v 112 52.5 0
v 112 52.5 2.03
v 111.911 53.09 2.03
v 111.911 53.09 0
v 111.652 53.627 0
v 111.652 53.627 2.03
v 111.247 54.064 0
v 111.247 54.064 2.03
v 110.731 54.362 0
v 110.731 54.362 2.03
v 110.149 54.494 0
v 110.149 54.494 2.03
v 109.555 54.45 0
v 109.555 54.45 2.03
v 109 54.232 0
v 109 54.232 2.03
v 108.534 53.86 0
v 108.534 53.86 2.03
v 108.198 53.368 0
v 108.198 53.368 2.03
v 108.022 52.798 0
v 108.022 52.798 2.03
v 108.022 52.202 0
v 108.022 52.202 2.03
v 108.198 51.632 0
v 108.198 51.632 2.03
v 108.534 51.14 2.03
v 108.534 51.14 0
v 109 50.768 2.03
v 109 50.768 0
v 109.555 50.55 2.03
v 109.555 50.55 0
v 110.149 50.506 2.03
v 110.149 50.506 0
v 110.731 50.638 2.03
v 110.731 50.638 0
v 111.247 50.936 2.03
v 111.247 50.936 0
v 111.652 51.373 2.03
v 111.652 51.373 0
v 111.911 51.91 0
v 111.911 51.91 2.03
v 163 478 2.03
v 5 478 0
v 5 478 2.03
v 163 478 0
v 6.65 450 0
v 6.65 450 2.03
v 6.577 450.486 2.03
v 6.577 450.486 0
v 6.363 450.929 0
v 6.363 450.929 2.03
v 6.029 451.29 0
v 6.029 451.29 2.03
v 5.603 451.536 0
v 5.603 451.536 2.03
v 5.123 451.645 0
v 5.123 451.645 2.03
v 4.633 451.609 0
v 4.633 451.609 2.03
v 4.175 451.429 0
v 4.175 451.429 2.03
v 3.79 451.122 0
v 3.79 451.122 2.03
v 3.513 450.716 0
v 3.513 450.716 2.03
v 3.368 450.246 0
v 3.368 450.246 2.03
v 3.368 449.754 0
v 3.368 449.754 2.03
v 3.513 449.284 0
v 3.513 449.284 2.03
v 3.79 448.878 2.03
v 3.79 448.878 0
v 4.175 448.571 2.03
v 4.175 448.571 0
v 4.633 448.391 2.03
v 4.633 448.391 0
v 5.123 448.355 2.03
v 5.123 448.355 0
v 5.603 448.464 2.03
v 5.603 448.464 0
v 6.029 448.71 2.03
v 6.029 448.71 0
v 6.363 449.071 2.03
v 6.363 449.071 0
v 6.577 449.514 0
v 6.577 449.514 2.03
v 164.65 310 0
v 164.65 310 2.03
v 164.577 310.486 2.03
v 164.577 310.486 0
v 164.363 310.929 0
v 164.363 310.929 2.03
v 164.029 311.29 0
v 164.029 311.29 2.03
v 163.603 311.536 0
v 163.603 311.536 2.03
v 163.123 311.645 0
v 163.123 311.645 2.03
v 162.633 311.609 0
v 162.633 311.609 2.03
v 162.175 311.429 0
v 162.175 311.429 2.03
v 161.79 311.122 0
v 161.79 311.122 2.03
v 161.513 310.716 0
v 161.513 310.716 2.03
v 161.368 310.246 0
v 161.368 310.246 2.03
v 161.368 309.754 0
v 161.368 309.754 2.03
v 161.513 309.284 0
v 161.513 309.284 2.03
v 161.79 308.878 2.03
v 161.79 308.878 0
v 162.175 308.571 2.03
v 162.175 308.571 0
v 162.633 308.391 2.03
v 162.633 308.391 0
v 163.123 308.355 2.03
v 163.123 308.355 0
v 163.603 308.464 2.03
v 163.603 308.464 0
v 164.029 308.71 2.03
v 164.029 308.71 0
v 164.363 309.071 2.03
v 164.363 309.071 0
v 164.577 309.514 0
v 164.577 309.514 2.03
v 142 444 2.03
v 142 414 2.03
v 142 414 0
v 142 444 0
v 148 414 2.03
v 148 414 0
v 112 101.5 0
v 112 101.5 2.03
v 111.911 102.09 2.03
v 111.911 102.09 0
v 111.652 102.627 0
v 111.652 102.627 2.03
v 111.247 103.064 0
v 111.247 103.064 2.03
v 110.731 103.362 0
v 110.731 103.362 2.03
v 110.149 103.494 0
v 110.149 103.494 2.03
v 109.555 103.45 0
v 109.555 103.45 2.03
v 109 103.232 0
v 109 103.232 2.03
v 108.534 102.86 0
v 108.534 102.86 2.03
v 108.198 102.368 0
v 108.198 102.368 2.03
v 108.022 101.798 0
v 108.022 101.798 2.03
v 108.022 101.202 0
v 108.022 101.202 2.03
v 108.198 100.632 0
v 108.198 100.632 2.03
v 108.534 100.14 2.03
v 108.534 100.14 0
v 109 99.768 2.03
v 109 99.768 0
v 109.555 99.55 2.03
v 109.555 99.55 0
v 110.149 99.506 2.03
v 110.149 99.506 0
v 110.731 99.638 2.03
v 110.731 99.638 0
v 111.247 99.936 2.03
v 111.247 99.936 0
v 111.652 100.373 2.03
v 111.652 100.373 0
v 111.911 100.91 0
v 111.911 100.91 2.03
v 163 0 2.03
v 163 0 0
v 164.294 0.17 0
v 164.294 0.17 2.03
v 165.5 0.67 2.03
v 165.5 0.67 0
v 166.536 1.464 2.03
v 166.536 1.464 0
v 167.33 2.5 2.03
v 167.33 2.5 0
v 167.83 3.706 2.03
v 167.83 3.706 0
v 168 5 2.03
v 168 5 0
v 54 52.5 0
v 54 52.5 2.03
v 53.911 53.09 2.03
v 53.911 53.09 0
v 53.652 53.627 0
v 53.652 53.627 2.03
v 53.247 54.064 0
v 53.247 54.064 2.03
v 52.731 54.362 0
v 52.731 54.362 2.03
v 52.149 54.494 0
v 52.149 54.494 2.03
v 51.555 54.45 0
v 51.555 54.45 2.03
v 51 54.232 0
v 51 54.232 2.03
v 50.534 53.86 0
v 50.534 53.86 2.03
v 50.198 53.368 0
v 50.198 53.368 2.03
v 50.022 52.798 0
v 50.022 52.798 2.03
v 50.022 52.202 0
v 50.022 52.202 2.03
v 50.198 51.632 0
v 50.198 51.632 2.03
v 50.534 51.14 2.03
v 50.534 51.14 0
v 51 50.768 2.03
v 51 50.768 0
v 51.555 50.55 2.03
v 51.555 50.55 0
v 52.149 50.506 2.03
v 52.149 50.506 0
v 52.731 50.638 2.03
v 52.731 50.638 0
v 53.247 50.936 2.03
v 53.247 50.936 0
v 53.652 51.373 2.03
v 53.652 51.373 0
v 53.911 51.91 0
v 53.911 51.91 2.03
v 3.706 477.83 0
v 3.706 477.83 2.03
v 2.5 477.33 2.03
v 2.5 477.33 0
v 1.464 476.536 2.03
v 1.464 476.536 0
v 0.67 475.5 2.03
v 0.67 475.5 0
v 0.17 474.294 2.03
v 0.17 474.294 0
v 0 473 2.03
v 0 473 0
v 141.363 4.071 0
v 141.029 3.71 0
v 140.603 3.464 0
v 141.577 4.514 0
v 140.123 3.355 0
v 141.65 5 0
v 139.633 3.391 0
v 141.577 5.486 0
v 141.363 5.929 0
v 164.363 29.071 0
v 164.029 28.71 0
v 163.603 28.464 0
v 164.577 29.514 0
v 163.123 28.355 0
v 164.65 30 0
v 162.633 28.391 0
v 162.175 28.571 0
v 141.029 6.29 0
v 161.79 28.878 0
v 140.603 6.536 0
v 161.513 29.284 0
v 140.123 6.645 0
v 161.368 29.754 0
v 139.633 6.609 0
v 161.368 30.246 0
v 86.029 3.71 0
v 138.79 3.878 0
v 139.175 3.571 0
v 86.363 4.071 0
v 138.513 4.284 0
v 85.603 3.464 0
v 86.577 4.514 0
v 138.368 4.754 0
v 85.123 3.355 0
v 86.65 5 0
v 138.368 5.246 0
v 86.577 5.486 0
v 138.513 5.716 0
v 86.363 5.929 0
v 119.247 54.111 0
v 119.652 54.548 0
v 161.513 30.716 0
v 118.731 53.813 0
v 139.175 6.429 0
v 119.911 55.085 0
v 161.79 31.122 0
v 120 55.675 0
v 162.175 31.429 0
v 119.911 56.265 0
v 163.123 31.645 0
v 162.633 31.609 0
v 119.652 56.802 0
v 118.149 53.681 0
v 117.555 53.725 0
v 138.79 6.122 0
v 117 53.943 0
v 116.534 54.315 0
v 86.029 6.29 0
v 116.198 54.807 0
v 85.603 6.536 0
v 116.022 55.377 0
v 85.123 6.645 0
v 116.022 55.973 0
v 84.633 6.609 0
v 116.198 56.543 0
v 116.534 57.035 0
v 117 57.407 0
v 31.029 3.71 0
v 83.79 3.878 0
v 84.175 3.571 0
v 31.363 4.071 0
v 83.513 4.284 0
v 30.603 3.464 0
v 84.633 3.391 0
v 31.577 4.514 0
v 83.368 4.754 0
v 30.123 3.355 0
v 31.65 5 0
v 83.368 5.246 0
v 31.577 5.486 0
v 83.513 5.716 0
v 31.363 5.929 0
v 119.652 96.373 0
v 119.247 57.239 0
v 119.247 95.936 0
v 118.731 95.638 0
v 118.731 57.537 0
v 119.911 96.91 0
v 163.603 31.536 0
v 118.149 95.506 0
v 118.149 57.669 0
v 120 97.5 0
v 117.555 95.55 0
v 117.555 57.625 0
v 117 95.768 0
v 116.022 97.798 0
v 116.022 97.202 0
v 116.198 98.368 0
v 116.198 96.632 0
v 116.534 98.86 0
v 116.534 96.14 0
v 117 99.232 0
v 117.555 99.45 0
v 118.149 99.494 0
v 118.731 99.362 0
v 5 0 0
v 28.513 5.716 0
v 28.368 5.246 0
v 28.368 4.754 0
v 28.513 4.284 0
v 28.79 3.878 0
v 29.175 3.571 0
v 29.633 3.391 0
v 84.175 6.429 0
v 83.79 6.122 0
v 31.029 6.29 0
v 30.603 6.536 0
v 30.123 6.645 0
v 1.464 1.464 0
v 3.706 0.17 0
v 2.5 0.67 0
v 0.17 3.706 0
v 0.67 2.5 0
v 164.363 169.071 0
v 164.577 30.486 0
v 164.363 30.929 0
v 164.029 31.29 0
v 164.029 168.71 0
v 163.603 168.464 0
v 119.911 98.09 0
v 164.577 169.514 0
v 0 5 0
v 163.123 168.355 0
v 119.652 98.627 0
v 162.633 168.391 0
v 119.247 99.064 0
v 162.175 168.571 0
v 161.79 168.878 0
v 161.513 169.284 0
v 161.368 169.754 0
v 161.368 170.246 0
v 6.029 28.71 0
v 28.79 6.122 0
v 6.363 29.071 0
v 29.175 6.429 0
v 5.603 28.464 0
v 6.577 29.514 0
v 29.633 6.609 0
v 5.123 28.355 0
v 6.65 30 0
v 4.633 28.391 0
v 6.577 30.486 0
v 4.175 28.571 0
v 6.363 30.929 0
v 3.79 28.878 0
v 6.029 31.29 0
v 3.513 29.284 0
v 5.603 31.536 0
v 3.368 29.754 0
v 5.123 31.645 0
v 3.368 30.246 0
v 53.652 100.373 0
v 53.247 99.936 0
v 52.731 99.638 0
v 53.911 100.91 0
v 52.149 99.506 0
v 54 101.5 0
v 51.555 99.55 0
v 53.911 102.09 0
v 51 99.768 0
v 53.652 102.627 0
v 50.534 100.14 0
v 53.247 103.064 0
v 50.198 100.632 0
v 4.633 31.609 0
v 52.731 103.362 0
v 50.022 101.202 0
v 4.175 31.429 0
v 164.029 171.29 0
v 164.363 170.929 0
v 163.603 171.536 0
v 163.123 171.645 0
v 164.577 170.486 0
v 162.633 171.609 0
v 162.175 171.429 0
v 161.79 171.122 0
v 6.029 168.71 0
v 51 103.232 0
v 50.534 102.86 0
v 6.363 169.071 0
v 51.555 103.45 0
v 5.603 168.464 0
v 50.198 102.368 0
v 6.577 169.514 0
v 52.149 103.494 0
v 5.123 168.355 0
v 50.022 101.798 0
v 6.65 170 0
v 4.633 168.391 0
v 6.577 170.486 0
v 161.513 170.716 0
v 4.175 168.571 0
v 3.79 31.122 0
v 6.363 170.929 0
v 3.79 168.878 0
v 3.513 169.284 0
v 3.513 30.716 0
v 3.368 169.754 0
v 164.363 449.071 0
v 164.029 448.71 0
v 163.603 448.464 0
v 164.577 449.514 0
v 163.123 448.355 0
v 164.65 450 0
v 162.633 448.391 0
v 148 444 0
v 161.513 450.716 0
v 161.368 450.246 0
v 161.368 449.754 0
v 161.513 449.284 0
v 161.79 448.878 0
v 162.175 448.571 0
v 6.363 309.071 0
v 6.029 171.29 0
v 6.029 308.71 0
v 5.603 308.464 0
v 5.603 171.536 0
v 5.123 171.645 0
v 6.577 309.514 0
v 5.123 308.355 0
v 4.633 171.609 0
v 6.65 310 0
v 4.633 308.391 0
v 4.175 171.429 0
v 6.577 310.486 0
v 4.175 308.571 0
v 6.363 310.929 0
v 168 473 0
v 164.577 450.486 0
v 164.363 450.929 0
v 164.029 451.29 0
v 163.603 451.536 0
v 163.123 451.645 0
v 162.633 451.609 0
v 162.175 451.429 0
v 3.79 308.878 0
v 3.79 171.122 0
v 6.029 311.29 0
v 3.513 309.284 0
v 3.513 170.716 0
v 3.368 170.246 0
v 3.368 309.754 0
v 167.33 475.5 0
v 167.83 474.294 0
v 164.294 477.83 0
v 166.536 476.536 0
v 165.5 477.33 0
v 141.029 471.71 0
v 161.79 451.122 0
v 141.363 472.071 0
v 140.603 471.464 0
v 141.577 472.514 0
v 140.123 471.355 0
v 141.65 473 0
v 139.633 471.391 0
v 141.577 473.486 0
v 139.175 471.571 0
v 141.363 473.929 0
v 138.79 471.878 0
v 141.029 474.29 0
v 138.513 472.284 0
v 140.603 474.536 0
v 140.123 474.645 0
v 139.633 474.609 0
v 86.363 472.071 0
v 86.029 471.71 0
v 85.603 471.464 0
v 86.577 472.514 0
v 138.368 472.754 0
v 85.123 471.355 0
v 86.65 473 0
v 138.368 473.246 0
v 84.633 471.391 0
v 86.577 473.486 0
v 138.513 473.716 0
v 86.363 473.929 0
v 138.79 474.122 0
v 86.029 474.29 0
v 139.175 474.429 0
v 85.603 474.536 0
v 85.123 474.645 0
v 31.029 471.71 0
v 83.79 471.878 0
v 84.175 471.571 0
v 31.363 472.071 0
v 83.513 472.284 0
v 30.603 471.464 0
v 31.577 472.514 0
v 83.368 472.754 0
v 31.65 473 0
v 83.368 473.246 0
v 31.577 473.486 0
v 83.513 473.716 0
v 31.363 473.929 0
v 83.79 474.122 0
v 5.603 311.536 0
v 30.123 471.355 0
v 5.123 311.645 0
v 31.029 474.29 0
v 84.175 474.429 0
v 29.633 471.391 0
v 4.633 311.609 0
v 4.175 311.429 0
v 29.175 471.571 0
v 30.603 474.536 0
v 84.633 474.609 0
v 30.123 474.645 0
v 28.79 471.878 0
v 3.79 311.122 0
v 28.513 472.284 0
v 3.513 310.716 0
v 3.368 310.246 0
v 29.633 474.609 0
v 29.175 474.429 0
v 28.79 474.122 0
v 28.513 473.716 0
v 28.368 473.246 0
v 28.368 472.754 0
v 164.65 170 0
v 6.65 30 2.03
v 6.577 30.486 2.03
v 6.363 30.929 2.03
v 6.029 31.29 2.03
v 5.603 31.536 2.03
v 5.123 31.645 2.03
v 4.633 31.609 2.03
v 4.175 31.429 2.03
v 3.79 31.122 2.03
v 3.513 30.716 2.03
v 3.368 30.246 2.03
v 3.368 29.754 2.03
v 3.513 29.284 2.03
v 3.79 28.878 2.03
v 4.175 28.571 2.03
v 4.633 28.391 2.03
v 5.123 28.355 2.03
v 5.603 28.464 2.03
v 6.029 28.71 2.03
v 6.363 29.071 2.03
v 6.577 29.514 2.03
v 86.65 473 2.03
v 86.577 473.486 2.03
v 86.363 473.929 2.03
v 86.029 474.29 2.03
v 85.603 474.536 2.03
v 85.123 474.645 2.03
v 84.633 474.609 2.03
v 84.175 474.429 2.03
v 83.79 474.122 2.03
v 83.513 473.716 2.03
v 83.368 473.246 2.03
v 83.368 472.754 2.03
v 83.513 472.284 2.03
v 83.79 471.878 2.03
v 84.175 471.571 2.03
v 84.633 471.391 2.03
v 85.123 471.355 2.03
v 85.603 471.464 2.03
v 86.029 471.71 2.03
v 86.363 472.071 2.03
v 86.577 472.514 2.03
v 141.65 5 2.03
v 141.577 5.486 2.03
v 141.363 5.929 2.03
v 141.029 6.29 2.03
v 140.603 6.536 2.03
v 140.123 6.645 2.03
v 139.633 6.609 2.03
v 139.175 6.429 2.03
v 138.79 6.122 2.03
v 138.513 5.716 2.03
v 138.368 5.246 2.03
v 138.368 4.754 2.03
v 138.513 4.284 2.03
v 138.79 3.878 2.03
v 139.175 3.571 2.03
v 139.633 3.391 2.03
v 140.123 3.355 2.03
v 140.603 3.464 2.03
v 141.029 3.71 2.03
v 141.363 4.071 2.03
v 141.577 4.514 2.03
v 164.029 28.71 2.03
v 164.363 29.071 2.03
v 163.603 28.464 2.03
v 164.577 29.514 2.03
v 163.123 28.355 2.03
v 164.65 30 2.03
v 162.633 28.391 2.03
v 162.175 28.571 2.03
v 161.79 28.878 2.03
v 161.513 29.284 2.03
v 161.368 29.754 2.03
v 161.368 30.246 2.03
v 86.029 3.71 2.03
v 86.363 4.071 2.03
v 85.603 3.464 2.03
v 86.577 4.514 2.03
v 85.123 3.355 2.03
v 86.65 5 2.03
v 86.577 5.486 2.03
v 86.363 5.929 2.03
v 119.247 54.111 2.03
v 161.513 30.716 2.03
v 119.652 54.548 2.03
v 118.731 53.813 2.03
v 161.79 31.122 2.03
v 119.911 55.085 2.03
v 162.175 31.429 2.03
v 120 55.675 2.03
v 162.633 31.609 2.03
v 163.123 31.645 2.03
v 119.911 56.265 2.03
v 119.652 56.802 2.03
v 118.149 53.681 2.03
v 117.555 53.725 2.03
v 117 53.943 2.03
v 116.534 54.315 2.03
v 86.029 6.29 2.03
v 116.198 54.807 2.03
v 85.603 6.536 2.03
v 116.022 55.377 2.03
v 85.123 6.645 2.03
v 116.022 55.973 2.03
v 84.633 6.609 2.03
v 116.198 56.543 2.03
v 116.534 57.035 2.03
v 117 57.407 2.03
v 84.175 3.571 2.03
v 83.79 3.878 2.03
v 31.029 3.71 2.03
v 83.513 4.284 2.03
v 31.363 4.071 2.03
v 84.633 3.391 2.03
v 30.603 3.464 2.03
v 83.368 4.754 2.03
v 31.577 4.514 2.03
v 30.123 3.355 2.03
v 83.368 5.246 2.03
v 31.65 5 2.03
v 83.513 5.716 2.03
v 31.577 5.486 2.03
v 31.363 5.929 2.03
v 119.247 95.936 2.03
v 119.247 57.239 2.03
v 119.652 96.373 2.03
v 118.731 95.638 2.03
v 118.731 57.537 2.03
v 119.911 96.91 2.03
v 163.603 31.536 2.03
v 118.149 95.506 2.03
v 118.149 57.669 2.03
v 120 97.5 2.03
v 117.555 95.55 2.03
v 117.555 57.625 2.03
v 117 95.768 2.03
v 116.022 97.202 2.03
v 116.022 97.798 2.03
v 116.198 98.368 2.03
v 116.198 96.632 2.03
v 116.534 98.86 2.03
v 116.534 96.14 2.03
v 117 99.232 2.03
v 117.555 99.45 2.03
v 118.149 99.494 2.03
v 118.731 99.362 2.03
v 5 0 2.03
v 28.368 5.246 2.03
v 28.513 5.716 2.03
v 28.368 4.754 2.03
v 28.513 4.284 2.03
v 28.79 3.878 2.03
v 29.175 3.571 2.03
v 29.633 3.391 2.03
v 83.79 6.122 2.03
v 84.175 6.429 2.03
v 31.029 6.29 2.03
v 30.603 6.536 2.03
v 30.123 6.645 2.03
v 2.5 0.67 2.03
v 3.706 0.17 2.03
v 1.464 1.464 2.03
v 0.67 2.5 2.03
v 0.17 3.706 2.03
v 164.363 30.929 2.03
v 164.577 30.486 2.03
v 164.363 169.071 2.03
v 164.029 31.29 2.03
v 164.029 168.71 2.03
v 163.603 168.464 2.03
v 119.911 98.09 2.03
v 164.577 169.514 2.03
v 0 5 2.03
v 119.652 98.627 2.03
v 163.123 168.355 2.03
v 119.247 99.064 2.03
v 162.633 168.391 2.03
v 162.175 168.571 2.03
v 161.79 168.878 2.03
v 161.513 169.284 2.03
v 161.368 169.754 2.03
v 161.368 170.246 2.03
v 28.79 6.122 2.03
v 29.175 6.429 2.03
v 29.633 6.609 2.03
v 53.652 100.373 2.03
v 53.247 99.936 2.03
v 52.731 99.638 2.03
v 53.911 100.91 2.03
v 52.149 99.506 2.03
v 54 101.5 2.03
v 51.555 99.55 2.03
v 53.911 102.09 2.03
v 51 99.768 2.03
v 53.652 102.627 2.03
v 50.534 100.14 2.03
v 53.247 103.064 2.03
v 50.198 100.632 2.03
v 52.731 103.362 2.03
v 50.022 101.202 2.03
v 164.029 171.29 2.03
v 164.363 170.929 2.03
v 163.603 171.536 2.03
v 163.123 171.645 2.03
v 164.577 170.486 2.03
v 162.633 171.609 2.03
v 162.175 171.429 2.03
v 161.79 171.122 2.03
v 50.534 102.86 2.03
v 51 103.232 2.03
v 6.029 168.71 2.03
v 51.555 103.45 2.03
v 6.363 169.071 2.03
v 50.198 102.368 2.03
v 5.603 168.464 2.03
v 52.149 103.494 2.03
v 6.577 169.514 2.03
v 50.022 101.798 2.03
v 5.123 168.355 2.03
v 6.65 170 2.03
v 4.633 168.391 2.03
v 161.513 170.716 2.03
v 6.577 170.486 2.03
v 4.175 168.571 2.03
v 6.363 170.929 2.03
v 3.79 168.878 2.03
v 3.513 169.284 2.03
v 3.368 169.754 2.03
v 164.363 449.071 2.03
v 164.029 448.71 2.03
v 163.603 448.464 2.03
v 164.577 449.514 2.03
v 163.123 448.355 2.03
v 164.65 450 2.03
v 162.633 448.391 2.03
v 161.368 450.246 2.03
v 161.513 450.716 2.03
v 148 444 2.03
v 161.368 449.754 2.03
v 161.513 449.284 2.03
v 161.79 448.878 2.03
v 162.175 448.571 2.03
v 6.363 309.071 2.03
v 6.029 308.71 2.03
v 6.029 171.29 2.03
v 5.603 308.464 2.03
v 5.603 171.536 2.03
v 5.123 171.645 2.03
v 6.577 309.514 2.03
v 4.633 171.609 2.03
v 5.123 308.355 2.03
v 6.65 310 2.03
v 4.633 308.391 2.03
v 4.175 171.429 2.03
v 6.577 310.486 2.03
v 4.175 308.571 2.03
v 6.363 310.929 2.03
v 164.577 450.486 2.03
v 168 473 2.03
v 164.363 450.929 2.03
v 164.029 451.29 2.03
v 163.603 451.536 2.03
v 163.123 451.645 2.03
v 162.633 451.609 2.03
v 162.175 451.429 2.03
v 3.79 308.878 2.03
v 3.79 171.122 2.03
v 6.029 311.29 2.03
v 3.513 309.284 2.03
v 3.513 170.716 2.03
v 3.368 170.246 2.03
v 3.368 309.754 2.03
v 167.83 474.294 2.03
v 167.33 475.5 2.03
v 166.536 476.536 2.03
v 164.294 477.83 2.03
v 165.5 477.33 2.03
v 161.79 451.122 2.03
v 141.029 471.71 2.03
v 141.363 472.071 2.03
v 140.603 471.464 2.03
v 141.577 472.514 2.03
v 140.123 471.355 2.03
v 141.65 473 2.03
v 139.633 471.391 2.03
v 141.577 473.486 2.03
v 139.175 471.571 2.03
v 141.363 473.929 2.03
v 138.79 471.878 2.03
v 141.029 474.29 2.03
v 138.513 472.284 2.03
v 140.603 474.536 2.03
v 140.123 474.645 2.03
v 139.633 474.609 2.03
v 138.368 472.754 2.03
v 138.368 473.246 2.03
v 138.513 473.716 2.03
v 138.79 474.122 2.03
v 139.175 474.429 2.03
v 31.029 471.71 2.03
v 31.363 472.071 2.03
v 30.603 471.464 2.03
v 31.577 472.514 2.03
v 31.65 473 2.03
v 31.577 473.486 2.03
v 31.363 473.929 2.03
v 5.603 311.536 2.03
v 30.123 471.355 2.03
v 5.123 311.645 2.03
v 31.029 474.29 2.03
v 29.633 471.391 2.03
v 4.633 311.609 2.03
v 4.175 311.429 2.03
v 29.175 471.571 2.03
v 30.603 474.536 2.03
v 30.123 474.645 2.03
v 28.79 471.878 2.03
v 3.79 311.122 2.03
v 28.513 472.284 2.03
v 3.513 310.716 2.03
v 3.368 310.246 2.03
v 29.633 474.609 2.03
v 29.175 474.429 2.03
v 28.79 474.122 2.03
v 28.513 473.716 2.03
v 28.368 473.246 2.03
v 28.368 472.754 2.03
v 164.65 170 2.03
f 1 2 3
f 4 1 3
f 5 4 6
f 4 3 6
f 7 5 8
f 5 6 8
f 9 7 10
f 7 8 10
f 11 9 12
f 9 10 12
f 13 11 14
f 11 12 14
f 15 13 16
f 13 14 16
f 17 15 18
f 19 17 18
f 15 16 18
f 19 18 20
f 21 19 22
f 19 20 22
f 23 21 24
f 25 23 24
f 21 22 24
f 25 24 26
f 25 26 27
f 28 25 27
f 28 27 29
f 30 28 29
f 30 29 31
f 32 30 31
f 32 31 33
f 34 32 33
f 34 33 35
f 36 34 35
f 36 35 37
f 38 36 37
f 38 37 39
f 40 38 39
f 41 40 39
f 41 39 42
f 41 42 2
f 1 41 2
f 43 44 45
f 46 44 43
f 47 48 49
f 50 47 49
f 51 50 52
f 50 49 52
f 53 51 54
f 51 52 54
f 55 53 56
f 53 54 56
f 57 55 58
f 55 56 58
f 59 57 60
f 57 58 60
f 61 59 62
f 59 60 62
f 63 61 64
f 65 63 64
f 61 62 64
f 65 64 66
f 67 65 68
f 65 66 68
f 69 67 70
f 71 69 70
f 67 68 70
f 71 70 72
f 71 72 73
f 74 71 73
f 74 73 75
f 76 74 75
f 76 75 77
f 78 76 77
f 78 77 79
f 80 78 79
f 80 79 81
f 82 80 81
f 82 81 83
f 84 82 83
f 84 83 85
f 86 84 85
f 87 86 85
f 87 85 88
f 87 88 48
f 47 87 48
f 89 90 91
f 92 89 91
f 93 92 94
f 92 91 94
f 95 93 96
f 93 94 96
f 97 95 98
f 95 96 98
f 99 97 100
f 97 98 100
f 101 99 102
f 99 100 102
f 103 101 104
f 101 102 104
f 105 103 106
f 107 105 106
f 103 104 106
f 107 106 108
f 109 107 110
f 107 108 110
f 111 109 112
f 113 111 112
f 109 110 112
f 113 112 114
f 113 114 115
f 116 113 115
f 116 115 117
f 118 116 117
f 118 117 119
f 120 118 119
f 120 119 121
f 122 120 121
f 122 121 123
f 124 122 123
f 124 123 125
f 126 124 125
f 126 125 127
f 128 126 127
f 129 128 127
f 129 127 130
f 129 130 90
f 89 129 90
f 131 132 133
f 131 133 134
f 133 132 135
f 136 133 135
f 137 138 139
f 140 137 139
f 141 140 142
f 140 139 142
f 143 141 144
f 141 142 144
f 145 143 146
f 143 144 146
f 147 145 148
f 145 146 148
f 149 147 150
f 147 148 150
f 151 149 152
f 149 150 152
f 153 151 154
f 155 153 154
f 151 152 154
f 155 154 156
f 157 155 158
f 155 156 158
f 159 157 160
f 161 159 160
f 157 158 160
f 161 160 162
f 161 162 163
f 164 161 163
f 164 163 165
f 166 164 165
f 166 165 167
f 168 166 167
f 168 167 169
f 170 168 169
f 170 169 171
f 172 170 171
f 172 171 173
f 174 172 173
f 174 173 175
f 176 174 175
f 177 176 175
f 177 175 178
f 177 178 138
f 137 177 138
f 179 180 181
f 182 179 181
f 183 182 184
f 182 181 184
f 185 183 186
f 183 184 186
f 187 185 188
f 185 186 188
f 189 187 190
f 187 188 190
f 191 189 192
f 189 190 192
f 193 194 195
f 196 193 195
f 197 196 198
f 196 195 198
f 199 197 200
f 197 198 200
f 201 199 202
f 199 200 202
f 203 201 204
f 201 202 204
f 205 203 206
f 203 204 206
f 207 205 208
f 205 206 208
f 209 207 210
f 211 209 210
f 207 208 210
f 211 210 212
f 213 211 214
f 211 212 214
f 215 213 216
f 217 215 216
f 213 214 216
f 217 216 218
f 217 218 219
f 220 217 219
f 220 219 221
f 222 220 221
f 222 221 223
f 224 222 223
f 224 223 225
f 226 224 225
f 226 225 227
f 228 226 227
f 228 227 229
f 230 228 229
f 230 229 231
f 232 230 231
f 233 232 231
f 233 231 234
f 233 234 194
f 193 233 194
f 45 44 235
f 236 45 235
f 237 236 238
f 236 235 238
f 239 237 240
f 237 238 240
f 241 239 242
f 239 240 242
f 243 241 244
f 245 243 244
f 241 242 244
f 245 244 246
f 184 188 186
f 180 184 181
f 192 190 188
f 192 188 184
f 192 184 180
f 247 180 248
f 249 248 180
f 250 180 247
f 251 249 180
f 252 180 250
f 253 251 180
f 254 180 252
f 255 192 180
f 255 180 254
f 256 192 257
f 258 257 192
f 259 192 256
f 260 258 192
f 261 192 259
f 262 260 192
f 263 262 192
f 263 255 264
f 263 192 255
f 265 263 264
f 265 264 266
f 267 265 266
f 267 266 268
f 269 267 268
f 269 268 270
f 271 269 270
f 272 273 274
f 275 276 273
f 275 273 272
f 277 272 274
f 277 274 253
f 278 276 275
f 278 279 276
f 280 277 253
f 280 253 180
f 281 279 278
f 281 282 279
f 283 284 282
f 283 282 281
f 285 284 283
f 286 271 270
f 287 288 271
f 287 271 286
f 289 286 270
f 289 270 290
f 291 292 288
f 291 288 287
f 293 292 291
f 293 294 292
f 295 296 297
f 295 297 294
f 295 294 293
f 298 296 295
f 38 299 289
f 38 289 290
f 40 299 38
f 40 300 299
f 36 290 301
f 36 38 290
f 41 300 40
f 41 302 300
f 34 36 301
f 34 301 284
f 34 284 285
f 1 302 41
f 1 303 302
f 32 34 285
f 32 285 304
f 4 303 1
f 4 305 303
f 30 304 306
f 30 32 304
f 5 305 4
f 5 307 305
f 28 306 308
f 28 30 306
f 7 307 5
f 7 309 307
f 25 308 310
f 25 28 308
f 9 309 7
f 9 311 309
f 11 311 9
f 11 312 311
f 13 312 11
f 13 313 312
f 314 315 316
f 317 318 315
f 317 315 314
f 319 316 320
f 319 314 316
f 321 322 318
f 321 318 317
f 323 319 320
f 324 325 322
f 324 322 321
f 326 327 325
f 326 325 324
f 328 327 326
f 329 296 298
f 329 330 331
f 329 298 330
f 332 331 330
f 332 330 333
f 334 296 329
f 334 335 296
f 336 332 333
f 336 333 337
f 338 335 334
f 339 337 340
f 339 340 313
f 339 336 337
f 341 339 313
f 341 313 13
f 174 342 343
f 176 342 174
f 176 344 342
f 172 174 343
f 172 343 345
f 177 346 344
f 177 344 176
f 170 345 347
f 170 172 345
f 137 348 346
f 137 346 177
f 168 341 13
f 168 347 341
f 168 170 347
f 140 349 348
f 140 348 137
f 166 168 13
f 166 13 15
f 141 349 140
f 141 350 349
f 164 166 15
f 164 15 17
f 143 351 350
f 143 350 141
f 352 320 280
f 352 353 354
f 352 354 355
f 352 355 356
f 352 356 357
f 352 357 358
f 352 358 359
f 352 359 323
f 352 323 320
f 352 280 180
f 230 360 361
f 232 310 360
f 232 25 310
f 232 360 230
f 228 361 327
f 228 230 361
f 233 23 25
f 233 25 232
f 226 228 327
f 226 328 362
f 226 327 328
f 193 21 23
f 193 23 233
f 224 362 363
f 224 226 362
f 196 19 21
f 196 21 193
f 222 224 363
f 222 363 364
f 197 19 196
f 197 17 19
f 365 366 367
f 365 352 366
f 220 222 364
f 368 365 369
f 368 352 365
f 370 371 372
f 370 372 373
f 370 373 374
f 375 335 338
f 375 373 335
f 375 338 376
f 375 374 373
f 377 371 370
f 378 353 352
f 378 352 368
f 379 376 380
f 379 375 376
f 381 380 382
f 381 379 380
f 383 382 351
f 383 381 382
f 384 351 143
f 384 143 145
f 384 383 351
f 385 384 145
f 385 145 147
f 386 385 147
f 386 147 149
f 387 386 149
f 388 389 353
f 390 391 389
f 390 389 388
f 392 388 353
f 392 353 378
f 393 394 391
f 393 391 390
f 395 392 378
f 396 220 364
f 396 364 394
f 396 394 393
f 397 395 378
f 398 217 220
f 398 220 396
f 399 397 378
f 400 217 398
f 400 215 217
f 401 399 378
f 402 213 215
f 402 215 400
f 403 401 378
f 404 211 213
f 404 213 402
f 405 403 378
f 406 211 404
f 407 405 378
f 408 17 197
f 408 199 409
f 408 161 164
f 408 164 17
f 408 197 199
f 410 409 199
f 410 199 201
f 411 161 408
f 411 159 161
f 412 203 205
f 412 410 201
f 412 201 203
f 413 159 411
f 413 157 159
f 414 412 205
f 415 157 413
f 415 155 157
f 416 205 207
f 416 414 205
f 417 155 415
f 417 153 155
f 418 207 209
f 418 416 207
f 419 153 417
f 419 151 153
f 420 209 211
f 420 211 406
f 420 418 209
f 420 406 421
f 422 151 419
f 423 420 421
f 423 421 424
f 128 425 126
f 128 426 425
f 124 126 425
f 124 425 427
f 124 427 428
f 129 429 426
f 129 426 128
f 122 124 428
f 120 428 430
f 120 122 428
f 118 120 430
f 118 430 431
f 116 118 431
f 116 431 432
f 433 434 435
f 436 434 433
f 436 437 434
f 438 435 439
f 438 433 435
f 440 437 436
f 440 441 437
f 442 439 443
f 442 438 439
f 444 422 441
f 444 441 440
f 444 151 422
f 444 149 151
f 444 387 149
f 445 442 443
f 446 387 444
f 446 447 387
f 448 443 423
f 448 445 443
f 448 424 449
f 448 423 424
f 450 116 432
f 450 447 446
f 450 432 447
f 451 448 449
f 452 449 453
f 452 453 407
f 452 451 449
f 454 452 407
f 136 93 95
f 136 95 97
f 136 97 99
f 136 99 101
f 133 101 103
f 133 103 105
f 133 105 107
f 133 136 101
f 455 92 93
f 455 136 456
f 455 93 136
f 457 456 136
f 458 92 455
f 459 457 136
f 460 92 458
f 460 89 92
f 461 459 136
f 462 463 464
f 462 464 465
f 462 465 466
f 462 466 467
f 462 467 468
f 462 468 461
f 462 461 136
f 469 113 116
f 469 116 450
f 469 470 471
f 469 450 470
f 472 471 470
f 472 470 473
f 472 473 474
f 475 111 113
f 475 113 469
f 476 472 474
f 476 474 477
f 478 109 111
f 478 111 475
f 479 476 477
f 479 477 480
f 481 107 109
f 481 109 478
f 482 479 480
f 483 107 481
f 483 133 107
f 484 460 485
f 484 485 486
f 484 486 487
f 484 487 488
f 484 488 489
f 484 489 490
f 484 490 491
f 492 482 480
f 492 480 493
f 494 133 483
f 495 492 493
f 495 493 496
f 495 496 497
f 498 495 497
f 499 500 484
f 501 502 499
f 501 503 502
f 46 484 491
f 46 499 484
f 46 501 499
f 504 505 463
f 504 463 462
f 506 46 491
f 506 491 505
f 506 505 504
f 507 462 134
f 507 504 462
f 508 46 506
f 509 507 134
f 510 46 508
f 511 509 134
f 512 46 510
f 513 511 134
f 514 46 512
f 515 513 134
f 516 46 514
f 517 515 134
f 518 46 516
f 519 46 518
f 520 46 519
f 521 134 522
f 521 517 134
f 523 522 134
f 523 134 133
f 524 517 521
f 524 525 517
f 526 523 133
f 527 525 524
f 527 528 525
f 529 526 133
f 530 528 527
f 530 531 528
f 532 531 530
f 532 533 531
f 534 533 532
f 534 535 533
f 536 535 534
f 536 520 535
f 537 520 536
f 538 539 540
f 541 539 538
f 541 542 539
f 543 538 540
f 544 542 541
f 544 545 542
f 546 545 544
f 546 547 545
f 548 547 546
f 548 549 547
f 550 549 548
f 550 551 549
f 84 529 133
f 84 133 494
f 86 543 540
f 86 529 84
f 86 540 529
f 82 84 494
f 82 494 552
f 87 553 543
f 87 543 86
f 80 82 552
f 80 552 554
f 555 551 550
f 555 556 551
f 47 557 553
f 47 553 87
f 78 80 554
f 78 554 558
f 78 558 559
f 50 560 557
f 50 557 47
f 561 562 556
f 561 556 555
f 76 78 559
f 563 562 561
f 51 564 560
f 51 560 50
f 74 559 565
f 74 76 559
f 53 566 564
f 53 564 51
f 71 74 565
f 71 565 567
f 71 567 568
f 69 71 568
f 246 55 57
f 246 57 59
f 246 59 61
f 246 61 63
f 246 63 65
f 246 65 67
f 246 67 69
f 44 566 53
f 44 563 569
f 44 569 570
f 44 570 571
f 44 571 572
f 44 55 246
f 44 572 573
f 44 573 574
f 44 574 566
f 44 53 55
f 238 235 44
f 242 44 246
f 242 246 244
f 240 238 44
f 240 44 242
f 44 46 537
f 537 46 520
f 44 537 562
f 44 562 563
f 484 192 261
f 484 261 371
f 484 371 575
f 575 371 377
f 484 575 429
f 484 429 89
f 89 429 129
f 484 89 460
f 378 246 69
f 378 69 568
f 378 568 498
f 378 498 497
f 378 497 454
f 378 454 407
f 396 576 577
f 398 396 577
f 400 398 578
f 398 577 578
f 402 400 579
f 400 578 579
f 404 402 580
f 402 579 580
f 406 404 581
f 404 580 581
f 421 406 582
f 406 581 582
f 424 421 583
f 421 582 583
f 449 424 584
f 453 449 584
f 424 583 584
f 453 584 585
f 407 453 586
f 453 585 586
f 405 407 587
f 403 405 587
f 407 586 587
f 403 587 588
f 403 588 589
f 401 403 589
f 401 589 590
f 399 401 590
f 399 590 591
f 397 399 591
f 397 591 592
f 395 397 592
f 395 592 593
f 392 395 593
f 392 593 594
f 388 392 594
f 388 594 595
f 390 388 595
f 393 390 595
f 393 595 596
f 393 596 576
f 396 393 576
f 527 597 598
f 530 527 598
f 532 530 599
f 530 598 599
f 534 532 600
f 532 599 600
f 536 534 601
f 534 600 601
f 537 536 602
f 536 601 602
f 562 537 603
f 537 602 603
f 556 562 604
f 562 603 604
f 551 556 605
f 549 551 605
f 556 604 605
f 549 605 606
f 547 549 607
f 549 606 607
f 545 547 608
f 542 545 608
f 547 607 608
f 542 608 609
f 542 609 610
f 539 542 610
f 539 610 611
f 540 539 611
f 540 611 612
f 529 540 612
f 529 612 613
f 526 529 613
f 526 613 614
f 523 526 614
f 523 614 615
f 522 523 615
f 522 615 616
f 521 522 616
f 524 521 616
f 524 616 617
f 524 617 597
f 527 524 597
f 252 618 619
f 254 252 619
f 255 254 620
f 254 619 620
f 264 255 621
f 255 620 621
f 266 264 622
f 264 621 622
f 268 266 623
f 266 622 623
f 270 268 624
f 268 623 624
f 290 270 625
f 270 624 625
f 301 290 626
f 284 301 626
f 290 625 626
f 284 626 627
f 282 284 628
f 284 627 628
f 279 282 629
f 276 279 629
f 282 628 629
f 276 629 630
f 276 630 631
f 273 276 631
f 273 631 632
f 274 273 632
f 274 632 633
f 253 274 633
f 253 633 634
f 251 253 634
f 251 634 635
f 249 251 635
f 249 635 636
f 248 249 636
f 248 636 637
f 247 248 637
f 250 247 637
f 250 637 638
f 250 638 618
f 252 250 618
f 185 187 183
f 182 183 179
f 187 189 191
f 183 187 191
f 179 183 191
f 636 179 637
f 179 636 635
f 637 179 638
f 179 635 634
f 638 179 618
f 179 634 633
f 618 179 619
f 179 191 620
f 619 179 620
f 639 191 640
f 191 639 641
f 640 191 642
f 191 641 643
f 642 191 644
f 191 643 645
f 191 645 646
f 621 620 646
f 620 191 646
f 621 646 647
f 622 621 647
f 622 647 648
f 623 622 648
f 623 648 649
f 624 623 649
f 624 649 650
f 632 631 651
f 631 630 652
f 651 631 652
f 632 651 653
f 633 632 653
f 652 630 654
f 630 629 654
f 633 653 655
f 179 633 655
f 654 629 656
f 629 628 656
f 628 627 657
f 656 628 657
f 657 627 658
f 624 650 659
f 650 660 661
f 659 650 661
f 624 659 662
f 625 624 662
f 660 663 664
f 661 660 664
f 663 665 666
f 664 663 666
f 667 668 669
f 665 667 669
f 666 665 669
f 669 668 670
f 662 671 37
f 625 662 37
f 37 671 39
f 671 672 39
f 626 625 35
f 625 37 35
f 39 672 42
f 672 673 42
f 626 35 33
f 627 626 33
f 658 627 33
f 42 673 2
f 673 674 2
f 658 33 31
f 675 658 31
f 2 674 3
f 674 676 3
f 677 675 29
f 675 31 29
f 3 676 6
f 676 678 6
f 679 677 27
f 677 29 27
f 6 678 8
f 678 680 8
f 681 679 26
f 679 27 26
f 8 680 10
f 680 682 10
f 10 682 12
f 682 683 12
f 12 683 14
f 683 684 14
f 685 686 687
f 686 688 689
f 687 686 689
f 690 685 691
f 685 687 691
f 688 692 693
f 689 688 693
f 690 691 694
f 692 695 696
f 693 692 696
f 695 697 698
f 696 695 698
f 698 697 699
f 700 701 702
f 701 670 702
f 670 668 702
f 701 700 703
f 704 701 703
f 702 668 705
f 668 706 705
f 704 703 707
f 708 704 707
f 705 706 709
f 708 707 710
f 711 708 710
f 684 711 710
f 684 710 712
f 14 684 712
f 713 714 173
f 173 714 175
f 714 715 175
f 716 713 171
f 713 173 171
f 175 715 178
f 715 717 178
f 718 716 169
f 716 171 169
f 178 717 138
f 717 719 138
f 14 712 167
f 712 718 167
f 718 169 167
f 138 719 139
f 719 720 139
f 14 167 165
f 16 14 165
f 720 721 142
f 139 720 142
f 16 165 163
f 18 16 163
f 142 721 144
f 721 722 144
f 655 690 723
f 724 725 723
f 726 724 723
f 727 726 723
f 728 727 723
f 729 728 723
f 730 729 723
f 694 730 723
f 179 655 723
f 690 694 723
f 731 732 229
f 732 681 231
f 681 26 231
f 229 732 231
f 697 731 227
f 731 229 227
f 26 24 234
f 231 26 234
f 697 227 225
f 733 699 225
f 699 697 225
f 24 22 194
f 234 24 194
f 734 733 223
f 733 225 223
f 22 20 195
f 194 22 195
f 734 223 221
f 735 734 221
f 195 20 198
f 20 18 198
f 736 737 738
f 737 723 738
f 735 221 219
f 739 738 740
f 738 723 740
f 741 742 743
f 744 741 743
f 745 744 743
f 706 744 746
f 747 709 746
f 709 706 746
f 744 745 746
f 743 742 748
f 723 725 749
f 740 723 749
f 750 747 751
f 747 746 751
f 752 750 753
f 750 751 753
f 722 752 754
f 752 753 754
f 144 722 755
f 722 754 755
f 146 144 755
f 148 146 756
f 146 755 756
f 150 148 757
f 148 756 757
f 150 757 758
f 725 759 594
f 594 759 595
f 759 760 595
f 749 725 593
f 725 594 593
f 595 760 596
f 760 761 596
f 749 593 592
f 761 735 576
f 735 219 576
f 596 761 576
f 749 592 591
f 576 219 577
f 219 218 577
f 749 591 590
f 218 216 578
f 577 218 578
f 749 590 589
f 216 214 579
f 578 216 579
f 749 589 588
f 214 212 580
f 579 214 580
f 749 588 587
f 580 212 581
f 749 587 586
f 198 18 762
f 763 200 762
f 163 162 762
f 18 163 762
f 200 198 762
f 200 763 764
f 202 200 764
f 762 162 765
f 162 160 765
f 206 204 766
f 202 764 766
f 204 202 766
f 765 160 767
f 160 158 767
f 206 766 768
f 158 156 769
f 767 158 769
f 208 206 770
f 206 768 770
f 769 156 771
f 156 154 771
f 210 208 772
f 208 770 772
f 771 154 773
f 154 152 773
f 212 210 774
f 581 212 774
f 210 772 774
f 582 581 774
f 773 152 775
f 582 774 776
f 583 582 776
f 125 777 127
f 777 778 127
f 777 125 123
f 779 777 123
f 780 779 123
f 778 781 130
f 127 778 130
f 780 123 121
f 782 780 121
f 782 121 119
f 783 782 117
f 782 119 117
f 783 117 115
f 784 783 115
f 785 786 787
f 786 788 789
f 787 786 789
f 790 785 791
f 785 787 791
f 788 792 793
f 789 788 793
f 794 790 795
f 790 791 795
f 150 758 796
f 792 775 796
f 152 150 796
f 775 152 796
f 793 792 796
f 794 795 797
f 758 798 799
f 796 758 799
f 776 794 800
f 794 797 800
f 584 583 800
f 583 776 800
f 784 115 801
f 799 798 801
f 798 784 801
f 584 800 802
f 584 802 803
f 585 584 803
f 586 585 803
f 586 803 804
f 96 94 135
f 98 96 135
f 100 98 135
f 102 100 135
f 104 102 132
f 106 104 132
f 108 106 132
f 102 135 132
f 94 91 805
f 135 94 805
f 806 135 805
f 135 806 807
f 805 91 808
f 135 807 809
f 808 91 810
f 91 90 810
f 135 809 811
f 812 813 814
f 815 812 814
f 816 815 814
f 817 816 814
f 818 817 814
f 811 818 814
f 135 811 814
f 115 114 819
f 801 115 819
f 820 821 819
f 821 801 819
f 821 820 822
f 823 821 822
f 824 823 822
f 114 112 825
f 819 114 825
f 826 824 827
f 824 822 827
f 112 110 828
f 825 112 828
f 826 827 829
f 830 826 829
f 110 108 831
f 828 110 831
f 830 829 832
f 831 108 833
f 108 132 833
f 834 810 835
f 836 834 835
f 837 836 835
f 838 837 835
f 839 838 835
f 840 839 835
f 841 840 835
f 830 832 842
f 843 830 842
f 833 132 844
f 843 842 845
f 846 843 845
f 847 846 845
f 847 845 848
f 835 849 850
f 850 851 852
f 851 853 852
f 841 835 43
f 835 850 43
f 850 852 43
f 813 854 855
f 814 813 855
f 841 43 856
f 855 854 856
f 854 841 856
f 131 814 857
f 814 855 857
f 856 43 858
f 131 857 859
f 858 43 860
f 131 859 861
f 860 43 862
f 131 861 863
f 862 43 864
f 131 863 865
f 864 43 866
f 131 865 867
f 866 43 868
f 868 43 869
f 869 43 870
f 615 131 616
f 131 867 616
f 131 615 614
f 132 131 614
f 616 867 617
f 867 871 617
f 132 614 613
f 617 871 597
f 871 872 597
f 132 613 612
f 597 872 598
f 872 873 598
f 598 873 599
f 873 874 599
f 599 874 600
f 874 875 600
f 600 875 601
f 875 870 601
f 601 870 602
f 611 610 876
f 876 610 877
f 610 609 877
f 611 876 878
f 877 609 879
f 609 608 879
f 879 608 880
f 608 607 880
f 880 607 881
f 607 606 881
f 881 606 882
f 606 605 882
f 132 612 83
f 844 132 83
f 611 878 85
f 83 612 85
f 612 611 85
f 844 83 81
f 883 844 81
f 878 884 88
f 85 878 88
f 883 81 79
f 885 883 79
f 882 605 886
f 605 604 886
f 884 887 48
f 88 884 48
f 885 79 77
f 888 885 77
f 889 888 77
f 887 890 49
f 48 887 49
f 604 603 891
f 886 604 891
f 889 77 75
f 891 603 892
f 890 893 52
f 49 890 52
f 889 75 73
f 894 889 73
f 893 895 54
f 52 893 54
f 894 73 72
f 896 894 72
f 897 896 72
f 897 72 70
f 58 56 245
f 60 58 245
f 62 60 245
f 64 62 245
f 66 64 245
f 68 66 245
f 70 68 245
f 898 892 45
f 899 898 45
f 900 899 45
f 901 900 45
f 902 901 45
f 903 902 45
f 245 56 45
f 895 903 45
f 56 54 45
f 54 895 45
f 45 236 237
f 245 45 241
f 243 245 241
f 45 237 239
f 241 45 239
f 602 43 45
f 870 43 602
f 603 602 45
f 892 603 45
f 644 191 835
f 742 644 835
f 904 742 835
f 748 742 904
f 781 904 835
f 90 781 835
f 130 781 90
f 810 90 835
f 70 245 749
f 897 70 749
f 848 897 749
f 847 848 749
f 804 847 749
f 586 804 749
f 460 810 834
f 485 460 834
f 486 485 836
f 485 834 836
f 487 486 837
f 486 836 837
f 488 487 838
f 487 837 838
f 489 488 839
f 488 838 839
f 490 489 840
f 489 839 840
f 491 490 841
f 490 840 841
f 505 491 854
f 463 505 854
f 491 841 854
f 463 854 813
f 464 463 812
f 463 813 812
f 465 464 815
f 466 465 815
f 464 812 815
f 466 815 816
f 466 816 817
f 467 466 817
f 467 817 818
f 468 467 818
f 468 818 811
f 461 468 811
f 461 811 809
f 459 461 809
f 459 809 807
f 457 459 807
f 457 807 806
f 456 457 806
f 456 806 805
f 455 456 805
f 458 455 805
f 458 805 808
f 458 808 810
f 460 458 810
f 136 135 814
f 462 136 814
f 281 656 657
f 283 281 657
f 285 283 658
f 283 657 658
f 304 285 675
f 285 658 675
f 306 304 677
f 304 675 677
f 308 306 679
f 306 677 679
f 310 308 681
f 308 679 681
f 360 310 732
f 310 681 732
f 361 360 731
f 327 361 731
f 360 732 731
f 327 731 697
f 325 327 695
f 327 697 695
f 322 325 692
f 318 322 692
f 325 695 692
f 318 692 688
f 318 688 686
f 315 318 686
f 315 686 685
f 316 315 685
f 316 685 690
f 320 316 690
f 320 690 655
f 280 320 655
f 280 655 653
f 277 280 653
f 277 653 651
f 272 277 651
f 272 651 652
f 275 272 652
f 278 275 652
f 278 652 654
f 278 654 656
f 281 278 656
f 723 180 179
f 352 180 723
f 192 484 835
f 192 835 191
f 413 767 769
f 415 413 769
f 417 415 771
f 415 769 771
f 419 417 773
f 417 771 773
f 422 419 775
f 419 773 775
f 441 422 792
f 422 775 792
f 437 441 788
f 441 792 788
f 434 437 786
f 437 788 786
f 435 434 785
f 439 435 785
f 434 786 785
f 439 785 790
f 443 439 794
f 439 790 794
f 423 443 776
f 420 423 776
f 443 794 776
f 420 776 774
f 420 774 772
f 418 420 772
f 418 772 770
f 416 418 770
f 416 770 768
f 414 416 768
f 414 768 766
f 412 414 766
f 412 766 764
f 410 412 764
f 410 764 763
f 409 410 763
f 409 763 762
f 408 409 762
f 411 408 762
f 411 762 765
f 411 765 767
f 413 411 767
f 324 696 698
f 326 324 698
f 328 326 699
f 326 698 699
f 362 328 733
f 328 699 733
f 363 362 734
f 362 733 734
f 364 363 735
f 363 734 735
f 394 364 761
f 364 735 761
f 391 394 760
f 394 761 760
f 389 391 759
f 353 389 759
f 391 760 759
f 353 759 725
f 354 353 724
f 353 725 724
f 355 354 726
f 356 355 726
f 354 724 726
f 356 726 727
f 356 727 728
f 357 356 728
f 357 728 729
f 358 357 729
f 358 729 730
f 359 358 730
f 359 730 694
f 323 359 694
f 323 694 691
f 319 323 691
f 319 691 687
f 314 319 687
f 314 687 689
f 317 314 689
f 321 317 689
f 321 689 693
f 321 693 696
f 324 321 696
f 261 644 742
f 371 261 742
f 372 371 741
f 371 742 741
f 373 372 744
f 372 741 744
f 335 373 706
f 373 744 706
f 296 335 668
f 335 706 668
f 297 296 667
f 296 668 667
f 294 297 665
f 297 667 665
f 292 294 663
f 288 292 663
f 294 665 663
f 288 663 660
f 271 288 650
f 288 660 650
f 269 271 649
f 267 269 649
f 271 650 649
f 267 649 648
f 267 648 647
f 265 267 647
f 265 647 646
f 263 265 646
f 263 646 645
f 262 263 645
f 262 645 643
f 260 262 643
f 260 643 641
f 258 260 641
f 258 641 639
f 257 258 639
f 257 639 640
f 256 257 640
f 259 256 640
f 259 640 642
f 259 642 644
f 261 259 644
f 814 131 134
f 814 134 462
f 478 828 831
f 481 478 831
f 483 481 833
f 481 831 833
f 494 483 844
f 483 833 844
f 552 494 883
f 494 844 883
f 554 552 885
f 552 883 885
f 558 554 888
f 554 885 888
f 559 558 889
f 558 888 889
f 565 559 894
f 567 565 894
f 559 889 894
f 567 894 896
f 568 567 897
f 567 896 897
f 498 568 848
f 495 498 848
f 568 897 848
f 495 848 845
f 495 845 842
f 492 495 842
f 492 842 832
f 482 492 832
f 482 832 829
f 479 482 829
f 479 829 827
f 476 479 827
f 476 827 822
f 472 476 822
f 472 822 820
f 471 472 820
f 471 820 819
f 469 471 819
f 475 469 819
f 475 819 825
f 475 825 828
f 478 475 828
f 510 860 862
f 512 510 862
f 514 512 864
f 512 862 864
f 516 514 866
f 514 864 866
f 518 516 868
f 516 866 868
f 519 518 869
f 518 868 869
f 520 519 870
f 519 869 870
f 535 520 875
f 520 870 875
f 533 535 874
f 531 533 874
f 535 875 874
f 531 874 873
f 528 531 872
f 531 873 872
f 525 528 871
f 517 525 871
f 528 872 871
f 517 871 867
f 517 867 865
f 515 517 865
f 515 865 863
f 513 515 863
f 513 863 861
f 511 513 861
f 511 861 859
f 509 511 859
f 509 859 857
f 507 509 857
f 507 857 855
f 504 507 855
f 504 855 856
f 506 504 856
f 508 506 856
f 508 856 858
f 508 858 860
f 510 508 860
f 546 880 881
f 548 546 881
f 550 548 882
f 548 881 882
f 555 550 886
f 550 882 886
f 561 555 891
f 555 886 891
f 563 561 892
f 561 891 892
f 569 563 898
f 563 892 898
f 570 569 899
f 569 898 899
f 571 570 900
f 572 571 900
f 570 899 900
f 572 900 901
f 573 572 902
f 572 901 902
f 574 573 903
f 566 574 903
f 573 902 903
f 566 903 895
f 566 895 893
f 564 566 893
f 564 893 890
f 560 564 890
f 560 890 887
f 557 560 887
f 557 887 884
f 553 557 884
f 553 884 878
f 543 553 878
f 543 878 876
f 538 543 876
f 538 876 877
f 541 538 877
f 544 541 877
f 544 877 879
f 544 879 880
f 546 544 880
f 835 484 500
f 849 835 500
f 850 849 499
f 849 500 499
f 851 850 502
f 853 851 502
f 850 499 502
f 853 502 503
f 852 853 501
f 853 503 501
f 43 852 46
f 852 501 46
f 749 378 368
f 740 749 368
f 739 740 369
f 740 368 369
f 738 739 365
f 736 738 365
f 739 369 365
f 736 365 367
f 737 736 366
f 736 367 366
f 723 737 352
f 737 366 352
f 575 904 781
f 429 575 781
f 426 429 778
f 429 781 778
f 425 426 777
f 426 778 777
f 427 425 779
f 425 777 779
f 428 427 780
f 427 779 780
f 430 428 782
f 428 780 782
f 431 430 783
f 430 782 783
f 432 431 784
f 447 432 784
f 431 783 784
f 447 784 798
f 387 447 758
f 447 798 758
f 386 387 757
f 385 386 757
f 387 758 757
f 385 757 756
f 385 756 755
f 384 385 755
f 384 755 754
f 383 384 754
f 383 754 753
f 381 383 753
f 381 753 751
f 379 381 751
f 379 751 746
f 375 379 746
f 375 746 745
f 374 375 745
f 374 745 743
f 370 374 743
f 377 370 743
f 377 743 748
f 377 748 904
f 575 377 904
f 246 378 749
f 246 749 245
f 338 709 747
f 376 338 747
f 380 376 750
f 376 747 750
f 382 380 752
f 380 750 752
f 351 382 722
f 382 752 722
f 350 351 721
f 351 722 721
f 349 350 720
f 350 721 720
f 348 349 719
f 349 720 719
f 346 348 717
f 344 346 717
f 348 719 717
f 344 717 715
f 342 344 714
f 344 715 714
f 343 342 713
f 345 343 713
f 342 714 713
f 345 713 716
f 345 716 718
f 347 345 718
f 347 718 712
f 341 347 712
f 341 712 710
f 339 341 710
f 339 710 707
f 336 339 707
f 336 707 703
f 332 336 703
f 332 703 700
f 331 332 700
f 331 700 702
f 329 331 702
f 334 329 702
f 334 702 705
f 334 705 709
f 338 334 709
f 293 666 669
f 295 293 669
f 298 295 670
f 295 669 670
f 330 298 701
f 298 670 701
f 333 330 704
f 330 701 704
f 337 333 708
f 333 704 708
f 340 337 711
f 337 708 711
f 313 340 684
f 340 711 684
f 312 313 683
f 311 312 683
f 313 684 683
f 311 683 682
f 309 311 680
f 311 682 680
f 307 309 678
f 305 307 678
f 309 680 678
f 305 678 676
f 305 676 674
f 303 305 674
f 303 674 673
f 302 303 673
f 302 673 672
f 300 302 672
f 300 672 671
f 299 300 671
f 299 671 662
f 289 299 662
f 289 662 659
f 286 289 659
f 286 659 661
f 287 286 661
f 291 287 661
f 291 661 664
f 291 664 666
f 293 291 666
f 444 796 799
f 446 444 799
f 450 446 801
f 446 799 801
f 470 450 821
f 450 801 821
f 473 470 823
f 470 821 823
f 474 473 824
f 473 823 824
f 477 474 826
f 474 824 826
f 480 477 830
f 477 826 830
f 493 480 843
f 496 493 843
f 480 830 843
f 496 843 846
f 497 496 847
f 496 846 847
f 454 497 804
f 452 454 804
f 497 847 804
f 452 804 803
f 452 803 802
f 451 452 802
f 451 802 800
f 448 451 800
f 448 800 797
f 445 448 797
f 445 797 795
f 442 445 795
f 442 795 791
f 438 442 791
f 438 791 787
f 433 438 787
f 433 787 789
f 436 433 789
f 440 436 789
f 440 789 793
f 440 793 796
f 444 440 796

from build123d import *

# Parameters (mm, degrees)
PAD_DEPTH       = 2.03
SKETCH001_R     = 1.65
POCKET_DEPTH    = 5
SKETCH002_W     = 6
SKETCH002_H     = 30
POCKET001_DEPTH = 5
SKETCH004_R     = 2
POCKET002_DEPTH = 5


with BuildPart() as part:
    # Sketch → Pad (new body)
    with BuildSketch(Plane.XY):
        with BuildLine():
            Line((5, 478), (163, 478))
            ThreePointArc((168, 473), (166.535534, 476.535534), (163, 478))
            Line((168, 473), (168, 5))
            ThreePointArc((163, 0), (166.535534, 1.464466), (168, 5))
            Line((163, 0), (5, 0))
            ThreePointArc((0, 5), (1.464466, 1.464466), (5, 0))
            Line((0, 5), (0, 473))
            ThreePointArc((5, 478), (1.464466, 476.535534), (0, 473))
        make_face()
    extrude(amount=PAD_DEPTH)

    # Sketch001 → Pocket (cut)
    with BuildSketch(Plane.XY.offset(2.03)):
        with Locations((140, 5)):
            Circle(SKETCH001_R)
        with Locations((30, 5)):
            Circle(SKETCH001_R)
        with Locations((85, 5)):
            Circle(SKETCH001_R)
        with Locations((5, 30)):
            Circle(SKETCH001_R)
        with Locations((163, 30)):
            Circle(SKETCH001_R)
        with Locations((163, 170)):
            Circle(SKETCH001_R)
        with Locations((163, 310)):
            Circle(SKETCH001_R)
        with Locations((5, 310)):
            Circle(SKETCH001_R)
        with Locations((5, 170)):
            Circle(SKETCH001_R)
        with Locations((5, 450)):
            Circle(SKETCH001_R)
        with Locations((30, 473)):
            Circle(SKETCH001_R)
        with Locations((85, 473)):
            Circle(SKETCH001_R)
        with Locations((140, 473)):
            Circle(SKETCH001_R)
        with Locations((163, 450)):
            Circle(SKETCH001_R)
    extrude(amount=-POCKET_DEPTH, mode=Mode.SUBTRACT)

    # Sketch002 → Pocket001 (cut)
    with BuildSketch(Plane.XY.offset(2.03)):
        with Locations((145, 429)):
            Rectangle(SKETCH002_W, SKETCH002_H)
    extrude(amount=-POCKET001_DEPTH, mode=Mode.SUBTRACT)

    # Sketch004 → Pocket002 (cut)
    with BuildSketch(Plane.XY.offset(2.03)):
        with Locations((118, 97.5)):
            Circle(SKETCH004_R)
        with Locations((118, 55.675)):
            Circle(SKETCH004_R)
        with Locations((52, 52.5)):
            Circle(SKETCH004_R)
        with Locations((52, 101.5)):
            Circle(SKETCH004_R)
        with Locations((110, 101.5)):
            Circle(SKETCH004_R)
        with Locations((110, 52.5)):
            Circle(SKETCH004_R)
    extrude(amount=-POCKET002_DEPTH, mode=Mode.SUBTRACT)


solid = part.part
